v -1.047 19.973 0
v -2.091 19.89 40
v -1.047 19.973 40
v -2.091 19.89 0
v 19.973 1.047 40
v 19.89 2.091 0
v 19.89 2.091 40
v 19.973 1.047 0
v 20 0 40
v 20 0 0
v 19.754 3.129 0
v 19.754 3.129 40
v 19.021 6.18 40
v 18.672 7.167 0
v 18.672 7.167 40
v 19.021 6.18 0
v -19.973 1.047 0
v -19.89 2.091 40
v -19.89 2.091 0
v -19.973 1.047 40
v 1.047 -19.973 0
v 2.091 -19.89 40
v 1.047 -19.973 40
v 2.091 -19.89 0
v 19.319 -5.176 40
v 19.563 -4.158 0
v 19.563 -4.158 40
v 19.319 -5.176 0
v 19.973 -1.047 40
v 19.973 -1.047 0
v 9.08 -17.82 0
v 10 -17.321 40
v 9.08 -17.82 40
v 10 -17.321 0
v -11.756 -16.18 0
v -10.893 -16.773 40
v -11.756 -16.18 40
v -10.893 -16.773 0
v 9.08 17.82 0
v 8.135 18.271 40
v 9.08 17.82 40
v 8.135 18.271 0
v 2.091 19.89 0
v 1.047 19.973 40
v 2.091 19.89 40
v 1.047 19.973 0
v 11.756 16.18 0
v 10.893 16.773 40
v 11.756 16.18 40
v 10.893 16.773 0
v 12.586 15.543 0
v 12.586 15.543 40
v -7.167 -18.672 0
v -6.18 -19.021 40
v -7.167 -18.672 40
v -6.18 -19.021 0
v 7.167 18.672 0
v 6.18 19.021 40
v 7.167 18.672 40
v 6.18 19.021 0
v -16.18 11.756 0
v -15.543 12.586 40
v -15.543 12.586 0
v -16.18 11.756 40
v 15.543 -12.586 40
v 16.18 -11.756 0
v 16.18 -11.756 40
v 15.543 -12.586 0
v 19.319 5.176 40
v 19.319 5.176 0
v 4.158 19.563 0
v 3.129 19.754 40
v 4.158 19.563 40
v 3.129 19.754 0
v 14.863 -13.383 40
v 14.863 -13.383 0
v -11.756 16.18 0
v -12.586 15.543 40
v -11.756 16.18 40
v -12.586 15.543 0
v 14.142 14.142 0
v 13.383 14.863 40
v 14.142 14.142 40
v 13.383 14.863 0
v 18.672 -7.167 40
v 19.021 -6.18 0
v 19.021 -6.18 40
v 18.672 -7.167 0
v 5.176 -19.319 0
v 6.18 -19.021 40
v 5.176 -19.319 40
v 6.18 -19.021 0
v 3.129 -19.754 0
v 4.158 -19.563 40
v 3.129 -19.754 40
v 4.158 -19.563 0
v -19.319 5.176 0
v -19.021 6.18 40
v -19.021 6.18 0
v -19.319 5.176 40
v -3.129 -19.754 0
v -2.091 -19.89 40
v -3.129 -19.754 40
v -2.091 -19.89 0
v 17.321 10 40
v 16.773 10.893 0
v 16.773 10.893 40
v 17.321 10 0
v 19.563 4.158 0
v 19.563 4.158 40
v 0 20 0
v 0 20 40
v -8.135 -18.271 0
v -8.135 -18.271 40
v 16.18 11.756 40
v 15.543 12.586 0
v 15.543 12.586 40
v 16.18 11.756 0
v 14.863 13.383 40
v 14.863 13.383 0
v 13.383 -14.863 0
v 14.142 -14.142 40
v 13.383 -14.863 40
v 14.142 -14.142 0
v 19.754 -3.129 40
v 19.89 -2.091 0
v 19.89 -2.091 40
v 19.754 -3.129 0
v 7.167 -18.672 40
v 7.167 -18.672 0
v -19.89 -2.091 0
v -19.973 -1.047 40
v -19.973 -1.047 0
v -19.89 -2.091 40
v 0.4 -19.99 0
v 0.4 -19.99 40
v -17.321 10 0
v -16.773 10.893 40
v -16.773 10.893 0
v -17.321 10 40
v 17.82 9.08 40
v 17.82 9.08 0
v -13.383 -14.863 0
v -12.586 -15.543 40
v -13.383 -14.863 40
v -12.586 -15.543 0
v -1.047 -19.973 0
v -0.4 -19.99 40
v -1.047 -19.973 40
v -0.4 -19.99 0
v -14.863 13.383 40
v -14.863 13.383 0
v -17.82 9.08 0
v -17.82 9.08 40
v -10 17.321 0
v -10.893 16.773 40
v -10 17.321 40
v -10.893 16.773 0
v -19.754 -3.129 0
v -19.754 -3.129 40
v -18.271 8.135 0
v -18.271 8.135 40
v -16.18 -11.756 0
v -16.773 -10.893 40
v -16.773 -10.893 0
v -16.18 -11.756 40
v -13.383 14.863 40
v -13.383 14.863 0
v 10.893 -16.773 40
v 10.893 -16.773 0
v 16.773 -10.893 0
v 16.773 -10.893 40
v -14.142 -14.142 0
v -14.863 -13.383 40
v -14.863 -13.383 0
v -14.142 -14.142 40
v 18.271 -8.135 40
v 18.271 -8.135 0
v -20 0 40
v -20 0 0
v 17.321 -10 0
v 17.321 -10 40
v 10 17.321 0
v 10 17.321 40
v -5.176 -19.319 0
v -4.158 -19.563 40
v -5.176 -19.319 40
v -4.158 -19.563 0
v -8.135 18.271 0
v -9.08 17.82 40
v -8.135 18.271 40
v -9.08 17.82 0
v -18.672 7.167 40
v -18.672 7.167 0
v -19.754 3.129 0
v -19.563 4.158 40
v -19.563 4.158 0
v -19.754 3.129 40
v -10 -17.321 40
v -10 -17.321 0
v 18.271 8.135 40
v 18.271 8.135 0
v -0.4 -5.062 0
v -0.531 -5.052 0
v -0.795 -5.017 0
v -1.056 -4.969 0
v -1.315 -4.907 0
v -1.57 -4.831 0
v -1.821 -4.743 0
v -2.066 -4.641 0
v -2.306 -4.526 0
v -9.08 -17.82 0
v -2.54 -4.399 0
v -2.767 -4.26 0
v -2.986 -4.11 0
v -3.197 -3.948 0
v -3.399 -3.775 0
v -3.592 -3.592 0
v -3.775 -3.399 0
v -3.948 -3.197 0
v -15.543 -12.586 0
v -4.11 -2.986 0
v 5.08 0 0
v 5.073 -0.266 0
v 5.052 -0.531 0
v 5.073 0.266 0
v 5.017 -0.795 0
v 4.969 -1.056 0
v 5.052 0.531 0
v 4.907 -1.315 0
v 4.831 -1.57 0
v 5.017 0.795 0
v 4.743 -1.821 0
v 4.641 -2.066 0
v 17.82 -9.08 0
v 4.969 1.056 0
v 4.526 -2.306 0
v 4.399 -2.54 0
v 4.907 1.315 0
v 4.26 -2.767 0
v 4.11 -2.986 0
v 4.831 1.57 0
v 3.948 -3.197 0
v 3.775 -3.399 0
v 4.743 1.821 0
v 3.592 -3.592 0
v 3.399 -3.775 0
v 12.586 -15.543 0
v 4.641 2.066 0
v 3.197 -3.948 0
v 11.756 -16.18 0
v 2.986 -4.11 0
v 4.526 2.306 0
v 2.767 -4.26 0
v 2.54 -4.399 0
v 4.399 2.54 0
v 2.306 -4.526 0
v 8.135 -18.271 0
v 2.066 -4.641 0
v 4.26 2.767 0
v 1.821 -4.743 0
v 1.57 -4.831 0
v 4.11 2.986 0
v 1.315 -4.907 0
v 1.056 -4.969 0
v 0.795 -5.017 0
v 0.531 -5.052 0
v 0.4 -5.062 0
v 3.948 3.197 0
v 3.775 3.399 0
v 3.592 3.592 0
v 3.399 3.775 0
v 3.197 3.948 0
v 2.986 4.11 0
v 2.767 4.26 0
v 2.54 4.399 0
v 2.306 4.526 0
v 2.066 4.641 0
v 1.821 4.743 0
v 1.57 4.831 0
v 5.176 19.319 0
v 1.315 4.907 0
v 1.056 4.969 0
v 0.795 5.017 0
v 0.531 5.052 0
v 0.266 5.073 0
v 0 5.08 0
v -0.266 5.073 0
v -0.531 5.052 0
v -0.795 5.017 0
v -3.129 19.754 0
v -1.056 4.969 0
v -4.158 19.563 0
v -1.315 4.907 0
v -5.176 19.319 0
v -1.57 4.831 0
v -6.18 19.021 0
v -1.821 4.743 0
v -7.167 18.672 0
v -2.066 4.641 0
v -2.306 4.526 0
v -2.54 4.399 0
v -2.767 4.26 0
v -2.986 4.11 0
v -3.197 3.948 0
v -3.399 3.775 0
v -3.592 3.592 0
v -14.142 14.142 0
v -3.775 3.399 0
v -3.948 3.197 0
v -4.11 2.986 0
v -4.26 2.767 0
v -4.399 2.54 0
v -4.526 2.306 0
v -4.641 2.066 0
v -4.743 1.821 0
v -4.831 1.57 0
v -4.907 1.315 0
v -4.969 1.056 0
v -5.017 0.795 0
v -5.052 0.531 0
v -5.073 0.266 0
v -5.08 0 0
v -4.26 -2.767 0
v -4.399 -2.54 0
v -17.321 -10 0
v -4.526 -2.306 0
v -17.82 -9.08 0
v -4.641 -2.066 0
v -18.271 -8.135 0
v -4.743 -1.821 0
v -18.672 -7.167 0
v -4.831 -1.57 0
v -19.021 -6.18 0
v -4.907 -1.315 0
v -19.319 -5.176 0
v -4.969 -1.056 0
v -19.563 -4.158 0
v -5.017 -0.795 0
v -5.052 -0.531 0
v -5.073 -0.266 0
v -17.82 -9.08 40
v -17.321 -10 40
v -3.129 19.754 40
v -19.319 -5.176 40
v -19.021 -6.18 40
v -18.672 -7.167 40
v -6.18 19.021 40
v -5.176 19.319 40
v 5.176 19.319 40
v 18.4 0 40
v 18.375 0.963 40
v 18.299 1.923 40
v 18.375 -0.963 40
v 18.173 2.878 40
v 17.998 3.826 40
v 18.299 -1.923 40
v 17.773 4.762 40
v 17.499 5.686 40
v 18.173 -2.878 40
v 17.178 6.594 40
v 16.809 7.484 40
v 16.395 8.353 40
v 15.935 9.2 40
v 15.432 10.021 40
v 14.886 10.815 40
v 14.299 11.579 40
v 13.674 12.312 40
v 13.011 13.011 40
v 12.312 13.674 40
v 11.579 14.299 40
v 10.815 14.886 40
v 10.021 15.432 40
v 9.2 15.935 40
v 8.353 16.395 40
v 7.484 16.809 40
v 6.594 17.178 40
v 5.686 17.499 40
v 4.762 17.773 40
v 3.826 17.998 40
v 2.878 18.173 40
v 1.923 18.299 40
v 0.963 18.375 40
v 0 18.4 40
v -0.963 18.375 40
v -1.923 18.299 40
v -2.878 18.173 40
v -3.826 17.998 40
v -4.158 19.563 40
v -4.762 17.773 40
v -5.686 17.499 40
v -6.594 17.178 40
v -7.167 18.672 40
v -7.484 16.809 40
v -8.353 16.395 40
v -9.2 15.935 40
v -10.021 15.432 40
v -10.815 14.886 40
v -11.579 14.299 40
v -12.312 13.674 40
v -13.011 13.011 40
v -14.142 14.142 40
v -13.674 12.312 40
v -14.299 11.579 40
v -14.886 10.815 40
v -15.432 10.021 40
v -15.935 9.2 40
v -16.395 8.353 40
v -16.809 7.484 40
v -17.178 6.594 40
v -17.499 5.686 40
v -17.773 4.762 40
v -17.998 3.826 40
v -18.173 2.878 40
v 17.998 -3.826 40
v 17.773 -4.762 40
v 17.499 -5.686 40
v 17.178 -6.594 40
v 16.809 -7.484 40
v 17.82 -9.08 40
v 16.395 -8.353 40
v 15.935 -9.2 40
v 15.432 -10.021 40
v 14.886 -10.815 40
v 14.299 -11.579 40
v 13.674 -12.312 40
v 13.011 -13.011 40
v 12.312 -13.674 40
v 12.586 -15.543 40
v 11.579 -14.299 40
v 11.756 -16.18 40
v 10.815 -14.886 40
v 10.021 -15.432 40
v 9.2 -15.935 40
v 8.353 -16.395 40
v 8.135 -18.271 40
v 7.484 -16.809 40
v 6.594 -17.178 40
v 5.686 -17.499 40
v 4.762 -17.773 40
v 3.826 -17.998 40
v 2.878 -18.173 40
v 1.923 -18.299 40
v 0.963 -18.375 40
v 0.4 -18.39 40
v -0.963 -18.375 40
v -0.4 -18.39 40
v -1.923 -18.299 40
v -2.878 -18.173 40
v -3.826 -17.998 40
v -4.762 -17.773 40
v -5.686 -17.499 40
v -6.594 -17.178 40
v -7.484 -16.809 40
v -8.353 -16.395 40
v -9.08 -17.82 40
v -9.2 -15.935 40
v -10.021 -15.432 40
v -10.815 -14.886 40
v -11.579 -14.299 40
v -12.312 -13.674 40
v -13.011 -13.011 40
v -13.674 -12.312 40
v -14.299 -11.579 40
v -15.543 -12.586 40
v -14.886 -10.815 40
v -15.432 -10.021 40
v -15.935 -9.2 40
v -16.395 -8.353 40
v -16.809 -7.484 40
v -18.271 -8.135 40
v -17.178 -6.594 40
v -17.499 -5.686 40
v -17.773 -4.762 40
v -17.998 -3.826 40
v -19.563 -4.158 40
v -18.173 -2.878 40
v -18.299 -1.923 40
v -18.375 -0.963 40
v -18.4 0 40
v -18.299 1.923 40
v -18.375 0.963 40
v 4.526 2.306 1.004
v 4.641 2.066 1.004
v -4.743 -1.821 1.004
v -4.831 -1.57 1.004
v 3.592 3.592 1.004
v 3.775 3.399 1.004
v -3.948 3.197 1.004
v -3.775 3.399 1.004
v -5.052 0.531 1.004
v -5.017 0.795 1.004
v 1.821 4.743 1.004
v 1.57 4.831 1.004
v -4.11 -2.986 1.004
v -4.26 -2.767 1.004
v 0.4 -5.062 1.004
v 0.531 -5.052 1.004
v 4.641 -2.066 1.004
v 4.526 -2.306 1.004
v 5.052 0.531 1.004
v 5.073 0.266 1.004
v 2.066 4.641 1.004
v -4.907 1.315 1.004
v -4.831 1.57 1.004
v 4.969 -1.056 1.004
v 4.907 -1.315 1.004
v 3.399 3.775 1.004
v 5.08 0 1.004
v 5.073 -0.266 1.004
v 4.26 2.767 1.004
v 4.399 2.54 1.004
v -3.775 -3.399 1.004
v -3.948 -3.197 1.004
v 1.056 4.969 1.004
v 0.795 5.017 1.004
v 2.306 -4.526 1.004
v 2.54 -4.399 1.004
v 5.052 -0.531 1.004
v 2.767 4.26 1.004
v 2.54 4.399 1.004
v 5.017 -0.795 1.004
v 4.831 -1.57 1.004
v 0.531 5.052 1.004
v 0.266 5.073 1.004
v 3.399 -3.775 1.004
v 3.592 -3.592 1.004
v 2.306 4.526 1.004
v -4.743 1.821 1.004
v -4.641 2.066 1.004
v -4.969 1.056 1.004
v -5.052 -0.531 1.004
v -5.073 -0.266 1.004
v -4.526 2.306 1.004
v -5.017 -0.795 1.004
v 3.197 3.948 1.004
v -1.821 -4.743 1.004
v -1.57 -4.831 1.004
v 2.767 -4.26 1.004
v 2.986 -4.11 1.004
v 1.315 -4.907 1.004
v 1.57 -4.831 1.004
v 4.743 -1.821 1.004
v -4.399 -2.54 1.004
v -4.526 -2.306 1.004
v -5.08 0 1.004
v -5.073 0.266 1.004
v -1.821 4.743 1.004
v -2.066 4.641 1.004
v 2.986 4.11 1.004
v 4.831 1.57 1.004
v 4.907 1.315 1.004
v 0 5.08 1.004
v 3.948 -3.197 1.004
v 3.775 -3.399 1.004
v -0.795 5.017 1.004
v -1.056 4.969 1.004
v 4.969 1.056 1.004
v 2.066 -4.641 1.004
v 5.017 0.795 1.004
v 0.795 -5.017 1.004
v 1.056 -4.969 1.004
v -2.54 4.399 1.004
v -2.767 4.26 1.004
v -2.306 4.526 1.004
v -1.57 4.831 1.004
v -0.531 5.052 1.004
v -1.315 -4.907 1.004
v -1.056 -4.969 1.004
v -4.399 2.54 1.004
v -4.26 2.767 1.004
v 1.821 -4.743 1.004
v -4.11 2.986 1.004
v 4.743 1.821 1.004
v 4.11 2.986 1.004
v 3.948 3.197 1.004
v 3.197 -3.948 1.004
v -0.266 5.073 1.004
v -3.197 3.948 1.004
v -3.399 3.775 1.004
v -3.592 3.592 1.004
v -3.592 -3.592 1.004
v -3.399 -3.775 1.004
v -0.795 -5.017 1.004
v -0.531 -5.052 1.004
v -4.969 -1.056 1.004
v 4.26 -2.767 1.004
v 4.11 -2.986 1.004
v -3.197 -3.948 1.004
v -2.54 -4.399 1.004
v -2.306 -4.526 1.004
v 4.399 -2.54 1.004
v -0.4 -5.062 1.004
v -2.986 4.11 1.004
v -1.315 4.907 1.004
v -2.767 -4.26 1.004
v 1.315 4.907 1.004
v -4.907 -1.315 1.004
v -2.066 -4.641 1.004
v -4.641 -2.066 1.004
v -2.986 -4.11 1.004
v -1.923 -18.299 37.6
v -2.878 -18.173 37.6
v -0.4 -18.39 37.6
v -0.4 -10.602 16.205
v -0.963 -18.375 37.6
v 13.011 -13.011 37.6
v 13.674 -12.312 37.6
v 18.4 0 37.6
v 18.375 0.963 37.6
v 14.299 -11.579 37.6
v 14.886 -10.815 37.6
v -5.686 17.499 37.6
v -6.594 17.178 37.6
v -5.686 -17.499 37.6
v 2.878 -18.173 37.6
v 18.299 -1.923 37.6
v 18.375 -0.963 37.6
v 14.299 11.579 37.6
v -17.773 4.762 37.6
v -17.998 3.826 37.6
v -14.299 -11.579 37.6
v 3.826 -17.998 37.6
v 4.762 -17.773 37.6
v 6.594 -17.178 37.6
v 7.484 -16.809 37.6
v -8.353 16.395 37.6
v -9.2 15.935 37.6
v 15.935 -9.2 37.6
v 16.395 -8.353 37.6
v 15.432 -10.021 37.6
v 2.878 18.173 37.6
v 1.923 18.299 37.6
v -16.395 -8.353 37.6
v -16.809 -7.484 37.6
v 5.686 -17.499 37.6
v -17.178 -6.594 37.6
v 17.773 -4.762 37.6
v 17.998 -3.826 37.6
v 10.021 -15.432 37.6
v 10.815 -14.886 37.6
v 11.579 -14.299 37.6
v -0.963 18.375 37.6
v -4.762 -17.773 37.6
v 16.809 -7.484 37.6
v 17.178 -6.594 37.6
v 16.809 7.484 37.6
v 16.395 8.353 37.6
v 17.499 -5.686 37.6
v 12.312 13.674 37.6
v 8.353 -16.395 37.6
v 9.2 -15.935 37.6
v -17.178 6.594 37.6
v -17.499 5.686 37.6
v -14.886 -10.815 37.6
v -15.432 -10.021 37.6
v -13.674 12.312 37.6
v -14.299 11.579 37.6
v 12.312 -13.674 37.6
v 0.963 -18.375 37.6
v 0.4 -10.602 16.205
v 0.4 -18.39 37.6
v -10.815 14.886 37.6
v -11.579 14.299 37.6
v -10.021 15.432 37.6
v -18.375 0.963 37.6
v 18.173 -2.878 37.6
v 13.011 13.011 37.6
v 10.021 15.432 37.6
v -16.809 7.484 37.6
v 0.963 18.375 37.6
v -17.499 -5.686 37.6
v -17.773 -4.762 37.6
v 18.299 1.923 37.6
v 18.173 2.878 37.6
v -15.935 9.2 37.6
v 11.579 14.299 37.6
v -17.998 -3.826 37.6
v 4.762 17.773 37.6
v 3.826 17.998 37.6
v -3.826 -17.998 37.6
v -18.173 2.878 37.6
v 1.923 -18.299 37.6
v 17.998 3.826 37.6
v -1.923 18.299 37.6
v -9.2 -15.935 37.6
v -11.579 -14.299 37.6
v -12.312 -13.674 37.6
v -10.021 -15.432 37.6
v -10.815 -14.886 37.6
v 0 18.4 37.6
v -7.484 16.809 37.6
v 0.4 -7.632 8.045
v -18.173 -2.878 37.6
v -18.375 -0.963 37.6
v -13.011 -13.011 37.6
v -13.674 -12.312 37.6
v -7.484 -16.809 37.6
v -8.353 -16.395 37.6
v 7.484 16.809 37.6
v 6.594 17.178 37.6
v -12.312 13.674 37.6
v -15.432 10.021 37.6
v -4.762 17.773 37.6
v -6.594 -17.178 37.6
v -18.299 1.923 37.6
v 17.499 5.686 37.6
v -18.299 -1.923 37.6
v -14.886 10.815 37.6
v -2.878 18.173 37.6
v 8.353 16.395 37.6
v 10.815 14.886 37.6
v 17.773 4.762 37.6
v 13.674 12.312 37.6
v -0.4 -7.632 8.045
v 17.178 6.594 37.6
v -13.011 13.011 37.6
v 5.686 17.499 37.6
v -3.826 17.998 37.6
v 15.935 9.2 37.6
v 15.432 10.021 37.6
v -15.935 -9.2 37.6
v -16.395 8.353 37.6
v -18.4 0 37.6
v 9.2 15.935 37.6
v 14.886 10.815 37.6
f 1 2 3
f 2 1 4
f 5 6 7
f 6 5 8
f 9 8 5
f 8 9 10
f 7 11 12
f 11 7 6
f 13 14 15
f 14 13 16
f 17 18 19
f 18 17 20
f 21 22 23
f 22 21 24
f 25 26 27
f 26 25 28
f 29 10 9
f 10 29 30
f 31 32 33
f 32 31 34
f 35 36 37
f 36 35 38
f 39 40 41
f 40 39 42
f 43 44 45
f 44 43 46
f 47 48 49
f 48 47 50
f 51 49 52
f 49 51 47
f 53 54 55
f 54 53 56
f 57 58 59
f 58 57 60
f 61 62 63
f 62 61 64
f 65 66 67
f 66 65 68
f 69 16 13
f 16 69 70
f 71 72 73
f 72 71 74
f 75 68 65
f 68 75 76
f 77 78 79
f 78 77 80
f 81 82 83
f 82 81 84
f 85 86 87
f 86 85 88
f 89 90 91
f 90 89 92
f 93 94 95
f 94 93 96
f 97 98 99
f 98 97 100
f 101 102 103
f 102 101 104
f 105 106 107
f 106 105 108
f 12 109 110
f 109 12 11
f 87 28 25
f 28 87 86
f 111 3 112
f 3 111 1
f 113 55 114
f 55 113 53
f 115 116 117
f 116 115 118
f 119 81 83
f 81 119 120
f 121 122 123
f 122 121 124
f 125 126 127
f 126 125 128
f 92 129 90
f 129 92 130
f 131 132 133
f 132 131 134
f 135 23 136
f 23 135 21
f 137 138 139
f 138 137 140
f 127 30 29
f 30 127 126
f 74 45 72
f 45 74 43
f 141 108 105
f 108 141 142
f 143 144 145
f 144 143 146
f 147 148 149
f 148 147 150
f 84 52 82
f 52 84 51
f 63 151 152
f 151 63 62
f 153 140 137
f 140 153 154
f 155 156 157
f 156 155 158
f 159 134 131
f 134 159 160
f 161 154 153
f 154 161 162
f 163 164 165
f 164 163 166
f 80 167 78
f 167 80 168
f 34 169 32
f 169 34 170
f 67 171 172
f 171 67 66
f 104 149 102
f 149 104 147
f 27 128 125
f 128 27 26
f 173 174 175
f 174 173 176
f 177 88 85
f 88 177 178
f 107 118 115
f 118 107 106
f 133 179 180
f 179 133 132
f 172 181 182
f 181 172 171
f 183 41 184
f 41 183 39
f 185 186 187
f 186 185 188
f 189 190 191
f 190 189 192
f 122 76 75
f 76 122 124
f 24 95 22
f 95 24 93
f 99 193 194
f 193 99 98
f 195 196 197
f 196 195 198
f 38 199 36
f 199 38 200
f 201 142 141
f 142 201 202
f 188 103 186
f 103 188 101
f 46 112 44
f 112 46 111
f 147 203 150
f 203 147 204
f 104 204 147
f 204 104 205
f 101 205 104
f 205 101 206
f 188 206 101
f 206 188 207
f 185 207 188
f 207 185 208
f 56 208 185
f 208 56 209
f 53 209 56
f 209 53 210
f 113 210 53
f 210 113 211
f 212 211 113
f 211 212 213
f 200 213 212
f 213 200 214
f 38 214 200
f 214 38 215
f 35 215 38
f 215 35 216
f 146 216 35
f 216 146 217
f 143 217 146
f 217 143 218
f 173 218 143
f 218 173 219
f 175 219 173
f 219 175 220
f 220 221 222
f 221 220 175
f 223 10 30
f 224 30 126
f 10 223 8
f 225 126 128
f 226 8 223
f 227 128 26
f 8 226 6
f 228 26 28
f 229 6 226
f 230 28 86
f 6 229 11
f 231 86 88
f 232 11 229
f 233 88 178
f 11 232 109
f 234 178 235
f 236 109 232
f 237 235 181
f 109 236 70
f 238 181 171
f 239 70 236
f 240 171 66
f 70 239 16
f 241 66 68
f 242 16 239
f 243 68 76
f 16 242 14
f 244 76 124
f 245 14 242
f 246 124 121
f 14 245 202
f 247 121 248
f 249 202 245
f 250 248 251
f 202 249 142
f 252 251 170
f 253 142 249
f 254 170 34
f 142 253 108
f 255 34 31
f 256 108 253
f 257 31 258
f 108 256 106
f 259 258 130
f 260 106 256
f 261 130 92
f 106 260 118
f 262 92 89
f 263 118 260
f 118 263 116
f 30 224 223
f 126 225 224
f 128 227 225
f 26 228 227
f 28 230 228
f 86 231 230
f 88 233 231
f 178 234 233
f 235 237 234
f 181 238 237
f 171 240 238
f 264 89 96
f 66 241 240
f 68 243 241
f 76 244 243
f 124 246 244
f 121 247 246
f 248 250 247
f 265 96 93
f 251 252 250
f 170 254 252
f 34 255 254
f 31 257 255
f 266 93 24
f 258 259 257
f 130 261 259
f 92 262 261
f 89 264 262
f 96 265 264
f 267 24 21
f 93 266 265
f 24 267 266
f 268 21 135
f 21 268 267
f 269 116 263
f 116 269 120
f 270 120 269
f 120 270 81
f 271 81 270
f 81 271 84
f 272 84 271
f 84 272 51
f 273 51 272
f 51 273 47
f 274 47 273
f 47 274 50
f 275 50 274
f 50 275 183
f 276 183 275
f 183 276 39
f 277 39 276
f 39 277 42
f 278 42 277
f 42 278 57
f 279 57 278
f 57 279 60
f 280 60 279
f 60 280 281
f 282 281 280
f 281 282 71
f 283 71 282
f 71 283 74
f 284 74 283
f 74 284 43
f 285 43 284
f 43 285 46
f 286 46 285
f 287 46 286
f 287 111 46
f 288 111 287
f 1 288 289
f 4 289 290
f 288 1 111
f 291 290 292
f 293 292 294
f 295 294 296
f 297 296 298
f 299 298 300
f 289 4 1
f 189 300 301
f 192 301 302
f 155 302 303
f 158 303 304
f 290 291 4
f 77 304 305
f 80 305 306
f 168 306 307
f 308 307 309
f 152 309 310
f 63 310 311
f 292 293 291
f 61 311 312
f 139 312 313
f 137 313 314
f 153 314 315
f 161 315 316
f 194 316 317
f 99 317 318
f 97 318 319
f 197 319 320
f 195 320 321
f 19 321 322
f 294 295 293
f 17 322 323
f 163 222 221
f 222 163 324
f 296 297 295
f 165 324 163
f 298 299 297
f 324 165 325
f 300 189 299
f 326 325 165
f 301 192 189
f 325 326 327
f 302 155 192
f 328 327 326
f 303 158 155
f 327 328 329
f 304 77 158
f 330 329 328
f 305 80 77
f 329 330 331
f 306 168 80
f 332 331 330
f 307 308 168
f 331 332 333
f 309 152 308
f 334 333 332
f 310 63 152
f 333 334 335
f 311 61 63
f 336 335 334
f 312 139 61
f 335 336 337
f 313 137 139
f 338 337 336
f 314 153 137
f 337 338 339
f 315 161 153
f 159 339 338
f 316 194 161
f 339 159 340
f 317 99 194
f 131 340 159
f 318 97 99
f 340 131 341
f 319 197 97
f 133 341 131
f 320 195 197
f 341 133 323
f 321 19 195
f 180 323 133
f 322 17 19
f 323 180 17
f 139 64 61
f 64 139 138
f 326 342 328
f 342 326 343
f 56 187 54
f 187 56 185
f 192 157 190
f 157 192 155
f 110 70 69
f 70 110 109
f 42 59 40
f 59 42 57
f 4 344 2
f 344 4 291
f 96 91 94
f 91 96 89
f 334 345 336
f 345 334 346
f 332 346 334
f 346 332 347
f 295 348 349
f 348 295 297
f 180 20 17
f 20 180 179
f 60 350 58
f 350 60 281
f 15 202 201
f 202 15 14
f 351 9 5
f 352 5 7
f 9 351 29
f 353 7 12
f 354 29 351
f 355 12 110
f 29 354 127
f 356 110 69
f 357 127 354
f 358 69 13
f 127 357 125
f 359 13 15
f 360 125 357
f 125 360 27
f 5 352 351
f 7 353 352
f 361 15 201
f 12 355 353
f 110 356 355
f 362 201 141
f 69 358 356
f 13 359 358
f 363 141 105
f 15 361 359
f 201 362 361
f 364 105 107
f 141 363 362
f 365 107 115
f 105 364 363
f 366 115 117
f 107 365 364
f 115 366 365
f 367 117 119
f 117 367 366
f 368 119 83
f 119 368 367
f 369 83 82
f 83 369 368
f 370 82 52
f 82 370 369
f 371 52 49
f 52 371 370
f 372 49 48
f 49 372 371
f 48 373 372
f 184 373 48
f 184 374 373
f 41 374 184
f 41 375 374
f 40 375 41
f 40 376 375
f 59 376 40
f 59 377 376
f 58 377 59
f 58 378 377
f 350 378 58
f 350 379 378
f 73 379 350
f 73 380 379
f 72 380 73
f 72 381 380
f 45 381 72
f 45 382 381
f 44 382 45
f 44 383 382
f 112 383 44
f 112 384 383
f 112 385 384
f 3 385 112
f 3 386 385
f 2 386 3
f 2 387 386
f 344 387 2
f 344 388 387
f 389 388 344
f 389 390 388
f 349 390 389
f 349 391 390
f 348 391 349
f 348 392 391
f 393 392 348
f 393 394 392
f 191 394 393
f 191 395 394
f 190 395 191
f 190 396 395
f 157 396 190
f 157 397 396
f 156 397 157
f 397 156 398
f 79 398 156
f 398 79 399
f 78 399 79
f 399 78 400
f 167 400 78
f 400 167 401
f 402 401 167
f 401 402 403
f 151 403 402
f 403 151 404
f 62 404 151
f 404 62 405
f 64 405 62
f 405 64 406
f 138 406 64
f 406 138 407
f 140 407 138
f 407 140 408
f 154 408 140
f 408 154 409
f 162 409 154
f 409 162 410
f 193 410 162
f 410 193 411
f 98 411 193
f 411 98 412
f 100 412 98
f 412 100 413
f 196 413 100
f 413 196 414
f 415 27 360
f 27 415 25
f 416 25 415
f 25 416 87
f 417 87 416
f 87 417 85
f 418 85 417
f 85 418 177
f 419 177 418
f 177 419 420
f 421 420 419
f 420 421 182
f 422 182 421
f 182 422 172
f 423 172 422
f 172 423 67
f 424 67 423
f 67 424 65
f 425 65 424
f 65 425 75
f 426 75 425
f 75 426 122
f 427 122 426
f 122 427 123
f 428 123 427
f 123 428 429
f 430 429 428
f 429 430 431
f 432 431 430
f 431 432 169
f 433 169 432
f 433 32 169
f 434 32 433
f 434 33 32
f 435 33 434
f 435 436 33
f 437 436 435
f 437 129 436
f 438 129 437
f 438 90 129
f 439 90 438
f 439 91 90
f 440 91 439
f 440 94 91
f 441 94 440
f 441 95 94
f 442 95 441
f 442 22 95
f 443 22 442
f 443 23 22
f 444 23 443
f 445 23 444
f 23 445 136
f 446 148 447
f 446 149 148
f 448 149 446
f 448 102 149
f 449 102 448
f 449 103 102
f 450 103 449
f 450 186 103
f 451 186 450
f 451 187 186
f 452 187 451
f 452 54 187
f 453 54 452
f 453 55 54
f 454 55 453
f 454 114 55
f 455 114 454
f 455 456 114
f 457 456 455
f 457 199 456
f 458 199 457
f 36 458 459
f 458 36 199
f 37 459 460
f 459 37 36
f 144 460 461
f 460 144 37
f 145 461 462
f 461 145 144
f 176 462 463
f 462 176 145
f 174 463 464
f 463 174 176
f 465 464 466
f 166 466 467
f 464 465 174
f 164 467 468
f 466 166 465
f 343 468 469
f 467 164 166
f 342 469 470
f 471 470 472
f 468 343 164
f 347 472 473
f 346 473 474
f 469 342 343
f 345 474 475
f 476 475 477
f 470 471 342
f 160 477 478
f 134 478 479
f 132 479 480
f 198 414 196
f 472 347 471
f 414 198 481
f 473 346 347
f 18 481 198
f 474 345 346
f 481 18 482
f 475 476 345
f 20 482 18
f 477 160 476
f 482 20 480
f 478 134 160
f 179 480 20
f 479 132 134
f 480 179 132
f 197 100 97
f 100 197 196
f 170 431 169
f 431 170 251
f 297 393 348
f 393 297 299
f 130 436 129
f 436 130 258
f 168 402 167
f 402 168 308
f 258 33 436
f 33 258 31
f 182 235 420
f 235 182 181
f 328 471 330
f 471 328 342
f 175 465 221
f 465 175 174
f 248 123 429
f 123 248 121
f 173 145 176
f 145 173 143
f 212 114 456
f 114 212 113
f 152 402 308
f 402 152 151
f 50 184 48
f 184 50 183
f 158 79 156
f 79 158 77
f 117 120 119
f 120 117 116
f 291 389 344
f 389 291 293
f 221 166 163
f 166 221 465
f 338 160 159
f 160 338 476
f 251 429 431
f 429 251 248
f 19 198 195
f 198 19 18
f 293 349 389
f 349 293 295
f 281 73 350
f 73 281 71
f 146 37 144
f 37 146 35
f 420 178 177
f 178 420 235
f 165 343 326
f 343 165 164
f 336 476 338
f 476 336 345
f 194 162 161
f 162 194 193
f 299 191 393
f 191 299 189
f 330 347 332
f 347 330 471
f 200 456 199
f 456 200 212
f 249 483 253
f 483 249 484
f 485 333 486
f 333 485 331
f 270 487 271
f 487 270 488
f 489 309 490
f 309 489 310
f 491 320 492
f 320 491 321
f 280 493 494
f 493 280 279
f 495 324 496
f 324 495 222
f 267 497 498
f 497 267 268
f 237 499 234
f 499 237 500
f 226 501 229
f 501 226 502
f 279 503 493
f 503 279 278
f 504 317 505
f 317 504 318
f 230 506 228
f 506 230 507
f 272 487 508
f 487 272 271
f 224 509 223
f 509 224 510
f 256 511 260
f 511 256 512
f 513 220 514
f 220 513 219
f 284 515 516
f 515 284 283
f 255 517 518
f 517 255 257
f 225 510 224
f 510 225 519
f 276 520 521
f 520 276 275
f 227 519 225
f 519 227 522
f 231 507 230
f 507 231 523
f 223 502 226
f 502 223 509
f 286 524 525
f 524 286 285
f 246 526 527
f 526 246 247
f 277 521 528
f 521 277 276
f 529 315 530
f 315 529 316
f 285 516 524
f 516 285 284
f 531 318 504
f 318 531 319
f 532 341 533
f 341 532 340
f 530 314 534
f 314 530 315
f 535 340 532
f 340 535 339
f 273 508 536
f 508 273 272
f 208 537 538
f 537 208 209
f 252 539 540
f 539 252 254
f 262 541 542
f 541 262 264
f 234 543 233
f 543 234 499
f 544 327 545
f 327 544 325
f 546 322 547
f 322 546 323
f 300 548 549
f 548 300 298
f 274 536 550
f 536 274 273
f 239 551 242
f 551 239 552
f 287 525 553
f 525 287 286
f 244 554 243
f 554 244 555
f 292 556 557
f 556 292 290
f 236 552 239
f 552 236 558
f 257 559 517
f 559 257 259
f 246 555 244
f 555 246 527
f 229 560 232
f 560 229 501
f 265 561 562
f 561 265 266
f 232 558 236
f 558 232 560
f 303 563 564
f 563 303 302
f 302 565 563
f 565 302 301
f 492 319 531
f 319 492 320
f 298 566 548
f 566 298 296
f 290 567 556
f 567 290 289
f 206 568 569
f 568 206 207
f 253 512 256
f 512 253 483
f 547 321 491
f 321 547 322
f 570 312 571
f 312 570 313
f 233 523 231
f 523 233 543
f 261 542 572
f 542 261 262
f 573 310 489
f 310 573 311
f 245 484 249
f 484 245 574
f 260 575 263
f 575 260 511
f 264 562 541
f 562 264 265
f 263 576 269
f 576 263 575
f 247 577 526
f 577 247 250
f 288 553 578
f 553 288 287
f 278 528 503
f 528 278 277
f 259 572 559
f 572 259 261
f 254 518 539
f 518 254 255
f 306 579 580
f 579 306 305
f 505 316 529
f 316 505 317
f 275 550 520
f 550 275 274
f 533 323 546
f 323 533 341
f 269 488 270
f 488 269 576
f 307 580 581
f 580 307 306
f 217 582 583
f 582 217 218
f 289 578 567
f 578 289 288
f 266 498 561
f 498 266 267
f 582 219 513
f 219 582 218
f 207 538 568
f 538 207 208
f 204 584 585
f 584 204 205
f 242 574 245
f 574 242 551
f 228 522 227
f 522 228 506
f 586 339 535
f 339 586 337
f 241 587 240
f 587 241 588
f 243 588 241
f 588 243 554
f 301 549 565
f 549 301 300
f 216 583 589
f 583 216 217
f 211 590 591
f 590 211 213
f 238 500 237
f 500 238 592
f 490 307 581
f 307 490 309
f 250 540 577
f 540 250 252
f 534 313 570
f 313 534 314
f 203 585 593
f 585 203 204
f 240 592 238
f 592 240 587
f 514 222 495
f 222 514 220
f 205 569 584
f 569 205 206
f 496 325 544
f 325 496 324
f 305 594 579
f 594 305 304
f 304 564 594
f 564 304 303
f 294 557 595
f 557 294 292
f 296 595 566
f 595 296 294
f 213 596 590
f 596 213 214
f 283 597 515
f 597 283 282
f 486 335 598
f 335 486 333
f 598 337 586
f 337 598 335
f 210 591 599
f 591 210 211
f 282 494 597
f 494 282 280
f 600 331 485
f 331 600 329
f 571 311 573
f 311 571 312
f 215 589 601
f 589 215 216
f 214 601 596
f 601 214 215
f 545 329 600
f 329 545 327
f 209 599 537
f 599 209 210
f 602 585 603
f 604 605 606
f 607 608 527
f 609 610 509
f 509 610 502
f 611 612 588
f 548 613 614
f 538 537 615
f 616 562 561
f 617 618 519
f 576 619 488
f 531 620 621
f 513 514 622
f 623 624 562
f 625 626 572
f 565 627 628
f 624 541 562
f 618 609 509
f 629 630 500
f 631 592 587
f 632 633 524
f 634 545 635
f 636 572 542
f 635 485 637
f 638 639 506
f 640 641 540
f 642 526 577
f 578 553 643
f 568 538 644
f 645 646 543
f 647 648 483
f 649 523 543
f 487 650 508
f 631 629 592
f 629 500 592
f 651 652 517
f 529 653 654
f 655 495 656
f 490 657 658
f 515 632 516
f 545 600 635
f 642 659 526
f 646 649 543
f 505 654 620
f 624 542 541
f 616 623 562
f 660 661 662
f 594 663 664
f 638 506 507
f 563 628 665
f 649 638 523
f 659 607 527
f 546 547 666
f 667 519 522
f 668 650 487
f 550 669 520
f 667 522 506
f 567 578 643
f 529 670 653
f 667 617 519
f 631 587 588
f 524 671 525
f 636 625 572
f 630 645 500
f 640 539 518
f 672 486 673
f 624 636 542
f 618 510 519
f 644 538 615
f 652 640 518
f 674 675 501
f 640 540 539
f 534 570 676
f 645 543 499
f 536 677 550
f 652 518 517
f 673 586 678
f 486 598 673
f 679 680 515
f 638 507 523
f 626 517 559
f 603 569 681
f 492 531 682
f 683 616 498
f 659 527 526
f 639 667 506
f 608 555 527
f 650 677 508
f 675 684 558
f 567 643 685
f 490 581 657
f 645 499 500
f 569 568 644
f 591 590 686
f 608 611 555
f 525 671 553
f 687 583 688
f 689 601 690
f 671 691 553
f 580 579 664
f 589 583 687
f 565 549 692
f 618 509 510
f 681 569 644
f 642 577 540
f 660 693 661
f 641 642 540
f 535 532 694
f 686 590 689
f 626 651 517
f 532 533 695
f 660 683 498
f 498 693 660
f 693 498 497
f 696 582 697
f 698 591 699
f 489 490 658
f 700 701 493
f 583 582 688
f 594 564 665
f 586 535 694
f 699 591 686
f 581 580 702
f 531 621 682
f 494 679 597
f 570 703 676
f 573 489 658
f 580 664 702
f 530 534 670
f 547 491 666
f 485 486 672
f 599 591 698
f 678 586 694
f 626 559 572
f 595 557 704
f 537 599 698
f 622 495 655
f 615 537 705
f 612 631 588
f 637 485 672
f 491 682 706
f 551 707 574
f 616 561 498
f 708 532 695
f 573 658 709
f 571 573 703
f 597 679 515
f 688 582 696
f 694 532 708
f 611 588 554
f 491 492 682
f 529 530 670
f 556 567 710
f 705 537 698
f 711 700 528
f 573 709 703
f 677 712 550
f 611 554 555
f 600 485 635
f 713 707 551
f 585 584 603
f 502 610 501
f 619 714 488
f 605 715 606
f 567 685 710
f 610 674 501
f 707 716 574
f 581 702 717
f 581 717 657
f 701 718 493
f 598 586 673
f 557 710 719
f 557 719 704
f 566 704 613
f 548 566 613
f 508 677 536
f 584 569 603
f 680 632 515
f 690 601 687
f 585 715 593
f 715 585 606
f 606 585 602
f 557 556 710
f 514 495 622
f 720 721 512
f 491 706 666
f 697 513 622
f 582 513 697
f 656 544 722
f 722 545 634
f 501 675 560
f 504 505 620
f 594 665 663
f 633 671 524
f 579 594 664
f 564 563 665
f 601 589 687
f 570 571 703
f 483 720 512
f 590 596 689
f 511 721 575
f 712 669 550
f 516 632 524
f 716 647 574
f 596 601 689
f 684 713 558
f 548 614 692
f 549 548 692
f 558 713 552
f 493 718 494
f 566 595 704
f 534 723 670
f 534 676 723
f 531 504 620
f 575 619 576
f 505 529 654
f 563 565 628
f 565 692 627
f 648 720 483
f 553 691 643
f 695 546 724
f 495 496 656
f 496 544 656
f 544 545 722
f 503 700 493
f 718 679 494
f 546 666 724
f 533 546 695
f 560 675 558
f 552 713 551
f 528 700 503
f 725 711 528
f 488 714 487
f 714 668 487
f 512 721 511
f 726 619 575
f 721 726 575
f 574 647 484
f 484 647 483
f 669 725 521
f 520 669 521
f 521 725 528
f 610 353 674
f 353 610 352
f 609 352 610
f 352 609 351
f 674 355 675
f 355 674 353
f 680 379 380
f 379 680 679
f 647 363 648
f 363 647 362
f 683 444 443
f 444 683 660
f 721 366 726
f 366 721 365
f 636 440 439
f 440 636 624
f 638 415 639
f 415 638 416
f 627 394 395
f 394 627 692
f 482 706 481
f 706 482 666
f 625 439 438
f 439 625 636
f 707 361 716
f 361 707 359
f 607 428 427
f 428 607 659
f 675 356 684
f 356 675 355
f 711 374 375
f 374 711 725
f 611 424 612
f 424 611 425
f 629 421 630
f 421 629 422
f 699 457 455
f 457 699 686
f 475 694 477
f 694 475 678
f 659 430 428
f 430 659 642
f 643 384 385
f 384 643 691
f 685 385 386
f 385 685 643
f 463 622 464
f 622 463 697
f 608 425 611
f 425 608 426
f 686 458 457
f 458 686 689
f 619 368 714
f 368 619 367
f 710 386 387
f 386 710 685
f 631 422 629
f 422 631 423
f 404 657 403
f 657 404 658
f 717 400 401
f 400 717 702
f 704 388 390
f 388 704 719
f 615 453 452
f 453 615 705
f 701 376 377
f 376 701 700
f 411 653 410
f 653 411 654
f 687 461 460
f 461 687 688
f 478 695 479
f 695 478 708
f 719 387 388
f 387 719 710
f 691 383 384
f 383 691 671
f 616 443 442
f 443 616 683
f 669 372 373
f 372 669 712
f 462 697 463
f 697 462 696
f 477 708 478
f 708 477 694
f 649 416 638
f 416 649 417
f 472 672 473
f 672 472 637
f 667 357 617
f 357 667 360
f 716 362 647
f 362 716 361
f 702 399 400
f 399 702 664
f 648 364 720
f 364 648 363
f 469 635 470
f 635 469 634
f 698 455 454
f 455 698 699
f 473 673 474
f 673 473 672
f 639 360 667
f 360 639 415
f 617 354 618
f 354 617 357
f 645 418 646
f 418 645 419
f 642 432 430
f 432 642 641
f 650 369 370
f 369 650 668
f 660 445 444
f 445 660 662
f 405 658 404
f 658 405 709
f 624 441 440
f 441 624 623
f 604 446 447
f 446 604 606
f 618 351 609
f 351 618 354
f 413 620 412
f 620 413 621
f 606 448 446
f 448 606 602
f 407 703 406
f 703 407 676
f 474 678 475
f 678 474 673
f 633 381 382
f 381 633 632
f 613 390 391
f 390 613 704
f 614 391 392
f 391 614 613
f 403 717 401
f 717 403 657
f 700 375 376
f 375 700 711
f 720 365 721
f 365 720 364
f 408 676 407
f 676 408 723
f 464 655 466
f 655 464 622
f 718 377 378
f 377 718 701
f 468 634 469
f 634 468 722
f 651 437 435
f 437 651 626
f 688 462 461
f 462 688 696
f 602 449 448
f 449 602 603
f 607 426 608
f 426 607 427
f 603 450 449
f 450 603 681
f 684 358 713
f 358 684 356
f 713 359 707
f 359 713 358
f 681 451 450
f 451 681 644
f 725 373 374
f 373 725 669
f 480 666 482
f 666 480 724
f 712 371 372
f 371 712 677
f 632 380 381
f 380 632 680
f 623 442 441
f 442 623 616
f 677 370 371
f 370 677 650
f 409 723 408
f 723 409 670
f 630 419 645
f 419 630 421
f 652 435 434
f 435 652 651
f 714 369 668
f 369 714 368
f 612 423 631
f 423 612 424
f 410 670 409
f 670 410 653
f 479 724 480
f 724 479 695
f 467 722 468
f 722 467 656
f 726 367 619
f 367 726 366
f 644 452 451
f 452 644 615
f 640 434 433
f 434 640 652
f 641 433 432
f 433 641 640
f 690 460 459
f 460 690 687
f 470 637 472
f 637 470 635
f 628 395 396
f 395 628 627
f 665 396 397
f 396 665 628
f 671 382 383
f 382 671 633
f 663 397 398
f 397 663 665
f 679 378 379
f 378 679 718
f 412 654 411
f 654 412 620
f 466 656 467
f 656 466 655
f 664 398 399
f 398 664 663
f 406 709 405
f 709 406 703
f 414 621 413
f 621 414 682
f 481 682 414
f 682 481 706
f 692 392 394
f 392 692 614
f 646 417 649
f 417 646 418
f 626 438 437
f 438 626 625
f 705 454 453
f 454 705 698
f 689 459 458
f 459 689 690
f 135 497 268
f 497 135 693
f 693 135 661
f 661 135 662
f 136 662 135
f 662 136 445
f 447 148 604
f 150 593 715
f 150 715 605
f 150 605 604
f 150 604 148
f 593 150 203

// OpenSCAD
// printer parameters
d_nozzle = 0.8;
h_layer = 0.6;

// TODO: needs to be refactored to use include statement https://github.com/openscad/openscad/issues/605#issuecomment-32962394

// design parameters
scale_factor = 0.2;

d_raft = 200*scale_factor;
h_raft = 200*scale_factor;

t_wall = d_nozzle;
t_wall_clearance = d_nozzle;
t_vert_wall = 4*h_layer;

//h_wicking_chamber = 55*scale_factor;
d_wicking_chamber = 50.8;
d_drainpipe = d_wicking_chamber*scale_factor;
overhang_angle = 70;

// Hidden variables:
$fn=120;

module conical_cavity() {
    h_conical_cavity=tan(overhang_angle)*(d_raft/2-2*t_wall-d_drainpipe/2);
    translate([0, 0, -h_conical_cavity])
    // cone
    cylinder(r1=d_drainpipe/2, r2=d_raft/2-2*t_wall, h=h_conical_cavity);

}

module donut() {
    difference() {
        cylinder(r=d_raft/2, h=h_raft);
        cylinder(r=d_drainpipe/2, h=h_raft);
    }
}

difference() {
    donut();
    
    // conical cavity
    translate([0, 0, h_raft-t_vert_wall])
    conical_cavity();

    // cylinder
    translate([0, 0, h_raft-t_vert_wall])
    cylinder(h=t_vert_wall, r=d_raft/2-2*t_wall);

    // keyhole for vasemode printing
    translate([-t_wall_clearance/2, -d_raft/2, 0])
    cube([t_wall_clearance, d_raft/2, h_raft]);
}
